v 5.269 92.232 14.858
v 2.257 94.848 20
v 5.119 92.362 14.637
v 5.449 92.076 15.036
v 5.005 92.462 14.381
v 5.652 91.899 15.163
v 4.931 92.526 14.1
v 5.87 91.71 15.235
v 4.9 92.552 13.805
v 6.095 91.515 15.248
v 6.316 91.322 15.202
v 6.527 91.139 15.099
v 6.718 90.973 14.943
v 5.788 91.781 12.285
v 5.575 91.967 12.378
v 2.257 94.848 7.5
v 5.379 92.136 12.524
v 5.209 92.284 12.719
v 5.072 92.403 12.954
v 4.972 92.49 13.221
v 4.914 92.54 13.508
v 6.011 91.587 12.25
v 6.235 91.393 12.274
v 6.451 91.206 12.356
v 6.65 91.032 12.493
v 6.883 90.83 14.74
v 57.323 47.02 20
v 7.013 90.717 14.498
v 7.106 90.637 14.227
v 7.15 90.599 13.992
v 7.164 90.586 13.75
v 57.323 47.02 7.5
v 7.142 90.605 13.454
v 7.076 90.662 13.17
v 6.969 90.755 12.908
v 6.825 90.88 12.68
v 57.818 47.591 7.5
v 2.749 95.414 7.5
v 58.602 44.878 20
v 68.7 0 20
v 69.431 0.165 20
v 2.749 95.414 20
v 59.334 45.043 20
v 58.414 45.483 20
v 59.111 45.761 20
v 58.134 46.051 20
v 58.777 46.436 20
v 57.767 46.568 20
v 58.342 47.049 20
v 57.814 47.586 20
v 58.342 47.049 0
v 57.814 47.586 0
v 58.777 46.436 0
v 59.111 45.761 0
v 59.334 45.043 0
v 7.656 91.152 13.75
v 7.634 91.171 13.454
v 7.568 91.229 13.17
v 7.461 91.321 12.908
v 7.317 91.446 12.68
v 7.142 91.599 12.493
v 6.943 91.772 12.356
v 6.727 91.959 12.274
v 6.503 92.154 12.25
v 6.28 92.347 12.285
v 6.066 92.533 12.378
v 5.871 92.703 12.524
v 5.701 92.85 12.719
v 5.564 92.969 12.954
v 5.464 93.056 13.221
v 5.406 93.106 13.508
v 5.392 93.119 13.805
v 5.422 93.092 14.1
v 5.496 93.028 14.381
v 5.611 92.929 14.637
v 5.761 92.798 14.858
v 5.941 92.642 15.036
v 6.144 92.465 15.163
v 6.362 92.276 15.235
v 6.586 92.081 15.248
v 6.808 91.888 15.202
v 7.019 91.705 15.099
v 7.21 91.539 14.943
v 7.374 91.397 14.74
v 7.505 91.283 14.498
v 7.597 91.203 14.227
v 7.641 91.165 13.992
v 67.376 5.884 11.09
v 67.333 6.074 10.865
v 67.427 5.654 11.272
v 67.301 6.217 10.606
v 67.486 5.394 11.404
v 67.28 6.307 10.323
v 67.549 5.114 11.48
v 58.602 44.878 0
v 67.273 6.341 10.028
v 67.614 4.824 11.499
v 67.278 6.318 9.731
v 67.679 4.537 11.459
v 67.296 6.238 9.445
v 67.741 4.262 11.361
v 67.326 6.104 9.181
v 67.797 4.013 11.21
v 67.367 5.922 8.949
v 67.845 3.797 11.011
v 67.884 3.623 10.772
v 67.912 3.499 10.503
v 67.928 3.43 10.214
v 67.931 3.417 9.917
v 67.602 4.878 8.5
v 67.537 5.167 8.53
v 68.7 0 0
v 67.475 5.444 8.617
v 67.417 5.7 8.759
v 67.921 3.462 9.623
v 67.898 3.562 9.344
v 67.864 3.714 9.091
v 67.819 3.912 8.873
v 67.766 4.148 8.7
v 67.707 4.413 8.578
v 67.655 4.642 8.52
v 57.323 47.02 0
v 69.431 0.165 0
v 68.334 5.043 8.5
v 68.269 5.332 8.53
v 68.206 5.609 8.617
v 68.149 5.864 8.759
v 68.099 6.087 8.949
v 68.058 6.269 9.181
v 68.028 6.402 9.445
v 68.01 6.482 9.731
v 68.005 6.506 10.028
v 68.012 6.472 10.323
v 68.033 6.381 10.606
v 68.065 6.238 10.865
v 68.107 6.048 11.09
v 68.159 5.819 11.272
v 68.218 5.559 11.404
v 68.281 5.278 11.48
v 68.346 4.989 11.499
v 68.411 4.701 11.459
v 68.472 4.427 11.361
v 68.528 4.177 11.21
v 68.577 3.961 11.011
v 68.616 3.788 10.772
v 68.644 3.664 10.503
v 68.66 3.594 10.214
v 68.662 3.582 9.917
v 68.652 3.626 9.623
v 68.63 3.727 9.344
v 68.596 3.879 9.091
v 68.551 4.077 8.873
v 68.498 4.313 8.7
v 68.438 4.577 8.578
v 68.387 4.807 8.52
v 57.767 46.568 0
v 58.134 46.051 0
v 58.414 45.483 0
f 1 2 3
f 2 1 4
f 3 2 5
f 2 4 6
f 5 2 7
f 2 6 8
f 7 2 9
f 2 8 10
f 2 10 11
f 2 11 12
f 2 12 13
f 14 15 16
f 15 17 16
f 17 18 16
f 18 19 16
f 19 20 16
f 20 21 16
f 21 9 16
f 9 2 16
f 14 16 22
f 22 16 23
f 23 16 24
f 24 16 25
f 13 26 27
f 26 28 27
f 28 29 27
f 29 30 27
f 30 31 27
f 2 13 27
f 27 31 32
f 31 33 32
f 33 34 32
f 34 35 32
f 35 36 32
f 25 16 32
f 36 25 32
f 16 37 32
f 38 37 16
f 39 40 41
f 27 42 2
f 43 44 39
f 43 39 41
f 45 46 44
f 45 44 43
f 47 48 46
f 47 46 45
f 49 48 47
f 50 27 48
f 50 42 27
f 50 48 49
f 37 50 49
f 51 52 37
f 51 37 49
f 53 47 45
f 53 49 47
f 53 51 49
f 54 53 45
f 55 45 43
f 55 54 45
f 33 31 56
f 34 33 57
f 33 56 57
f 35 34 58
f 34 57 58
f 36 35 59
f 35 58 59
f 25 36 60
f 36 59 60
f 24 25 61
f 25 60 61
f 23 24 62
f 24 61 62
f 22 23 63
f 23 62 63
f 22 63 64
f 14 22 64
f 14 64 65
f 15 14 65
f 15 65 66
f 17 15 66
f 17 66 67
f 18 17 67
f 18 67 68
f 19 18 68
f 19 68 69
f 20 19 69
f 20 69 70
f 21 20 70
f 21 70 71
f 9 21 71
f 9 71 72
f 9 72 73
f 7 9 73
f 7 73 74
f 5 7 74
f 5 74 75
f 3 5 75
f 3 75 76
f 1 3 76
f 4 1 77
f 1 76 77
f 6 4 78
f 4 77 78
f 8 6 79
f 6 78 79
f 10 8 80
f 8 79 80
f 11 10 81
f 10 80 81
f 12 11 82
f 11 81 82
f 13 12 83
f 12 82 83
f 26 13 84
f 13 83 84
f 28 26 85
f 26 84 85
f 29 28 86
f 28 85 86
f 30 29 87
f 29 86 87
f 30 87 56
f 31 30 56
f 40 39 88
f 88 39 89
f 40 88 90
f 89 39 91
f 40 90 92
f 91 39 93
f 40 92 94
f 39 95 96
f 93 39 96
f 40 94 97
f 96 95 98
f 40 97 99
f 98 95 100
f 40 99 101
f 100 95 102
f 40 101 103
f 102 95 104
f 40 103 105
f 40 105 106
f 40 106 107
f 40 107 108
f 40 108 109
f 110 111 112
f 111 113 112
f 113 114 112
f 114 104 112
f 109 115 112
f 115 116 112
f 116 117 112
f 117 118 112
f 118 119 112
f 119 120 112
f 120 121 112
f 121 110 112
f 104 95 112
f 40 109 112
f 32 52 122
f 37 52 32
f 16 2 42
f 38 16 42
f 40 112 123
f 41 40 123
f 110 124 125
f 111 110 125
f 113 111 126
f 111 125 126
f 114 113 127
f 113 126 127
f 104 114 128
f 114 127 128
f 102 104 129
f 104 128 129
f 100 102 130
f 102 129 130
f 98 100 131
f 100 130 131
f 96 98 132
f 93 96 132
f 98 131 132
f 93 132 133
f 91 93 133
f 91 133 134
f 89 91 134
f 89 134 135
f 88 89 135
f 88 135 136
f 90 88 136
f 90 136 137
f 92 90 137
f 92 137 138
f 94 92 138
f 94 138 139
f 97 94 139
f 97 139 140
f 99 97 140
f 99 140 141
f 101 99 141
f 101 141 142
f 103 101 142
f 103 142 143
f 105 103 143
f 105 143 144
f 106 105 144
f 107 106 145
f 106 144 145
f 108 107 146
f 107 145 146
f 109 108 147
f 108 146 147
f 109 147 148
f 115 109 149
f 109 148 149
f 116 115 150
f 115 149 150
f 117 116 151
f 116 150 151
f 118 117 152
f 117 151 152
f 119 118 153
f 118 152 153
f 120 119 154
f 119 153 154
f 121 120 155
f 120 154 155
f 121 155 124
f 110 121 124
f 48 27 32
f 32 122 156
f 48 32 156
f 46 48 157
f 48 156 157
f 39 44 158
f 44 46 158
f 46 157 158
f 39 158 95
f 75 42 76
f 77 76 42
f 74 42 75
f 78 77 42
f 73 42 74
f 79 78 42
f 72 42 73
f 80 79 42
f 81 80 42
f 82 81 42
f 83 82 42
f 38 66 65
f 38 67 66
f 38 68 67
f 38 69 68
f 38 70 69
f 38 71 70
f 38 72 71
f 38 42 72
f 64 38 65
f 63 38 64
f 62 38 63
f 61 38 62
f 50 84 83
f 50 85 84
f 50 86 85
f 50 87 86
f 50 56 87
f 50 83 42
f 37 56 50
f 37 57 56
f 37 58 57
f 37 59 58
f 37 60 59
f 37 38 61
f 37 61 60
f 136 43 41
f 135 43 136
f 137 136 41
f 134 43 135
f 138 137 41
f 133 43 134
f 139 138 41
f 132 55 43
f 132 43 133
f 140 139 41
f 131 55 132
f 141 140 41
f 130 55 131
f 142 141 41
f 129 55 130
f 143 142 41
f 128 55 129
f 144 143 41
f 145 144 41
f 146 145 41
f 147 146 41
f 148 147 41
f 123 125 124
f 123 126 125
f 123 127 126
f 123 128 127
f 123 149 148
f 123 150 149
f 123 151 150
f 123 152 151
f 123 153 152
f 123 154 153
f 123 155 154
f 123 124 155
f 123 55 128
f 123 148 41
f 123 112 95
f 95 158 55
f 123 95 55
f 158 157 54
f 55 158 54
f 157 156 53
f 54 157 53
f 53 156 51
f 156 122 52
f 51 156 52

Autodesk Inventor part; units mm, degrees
ref_plane "YZ Plane" through (0, 0, 0) normal (1, 0, 0) x (0, 1, 0)
ref_plane "XZ Plane" through (0, 0, 0) normal (0, 1, 0) x (-1, 0, 0)
ref_plane "XY Plane" through (0, 0, 0) normal (0, 0, 1) x (1, 0, 0)
sketch "スケッチ1" plane through (0, 0, 0) normal (0, 0, 1) x (1, 0, 0)
  circle A0 centre (54.6996, 44) radius 4
  line L0 (62.6996, 0) -> (65.6996, 0)
  circle A1 centre (-0.366, 91.8281) radius 4
  circle A2 centre (-0.366, 91.8281) radius 4
  circle A3 centre (54.6996, 44) radius 4
  line L1 (58.602, 44.878) -> (68.6996, 0)
  line L2 (2.257, 94.8481) -> (57.3226, 47.0199)
  line L3 (2.7488, 95.4143) -> (57.8144, 47.5861)
  line L4 (59.3337, 45.0427) -> (69.4313, 0.1646)
  circle A4 centre (54.6996, 44) radius 4.75
  line L5 (2.257, 94.8481) -> (2.7488, 95.4143)
  line L6 (68.6996, 0) -> (69.4313, 0.1646)
  point P0 (0, 0)
  dimension "d0" = 0.75
  dimension "d1" = 0.75
  dimension "d2" = 0.75
extrude "押し出し1" add sketch "スケッチ1" along normal blind 20 contours A0 L2 A4 L1 | A4 L4 L6 L1 | L2 L5 L3 A4 picked at (56.3248, 48.0683)
sketch "スケッチ2" plane through (2.7488, 95.4143, 20) normal (0.6557, 0.755, 0) x (0.755, -0.6557, 0)
  line L0 (72.9366, 20) -> (0, 20) projected
  line L1 (0, 20) -> (0, 0) projected
  line L2 (72.9366, 0) -> (0, 0) projected
  line L3 (72.9366, 20) -> (72.9366, 0) projected
  line L4 (5, 0) -> (5, 20)
  circle A0 centre (5, 6.25) radius 1.5
  line L5 (72.9366, 12.5) -> (0, 12.5)
  point P0 (60.4926, 20)
  dimension "d5" = 5
  dimension "d6" = 3
  dimension "d7" = 6.25
  dimension "d15" = 7.5
sketch "スケッチ3" plane through (59.3337, 45.0427, 20) normal (0.9756, 0.2195, 0) x (0, 0, -1)
  line L0 (20, -46) -> (20, 0) projected
  line L1 (20, 0) -> (0, 0) projected
  line L2 (0, -46) -> (0, 0) projected
  line L3 (20, -46) -> (0, -46) projected
  line L4 (0, -41) -> (20, -41)
  circle A0 centre (10, -41) radius 1.5
  point P0 (20, -30.9196)
  dimension "d8" = 5
  dimension "d9" = 3
  dimension "d10" = 10
extrude "押し出し2" cut sketch "スケッチ2" against normal blind 10 contours L3 L5 L4 L0 | L4 L5 L1 L0 | A0 L4 | L4 A0
extrude "押し出し3" cut sketch "スケッチ3" against normal blind 10 contours A0 L4 | L4 A0
properties part number "アームガードfull" material "ポリプロピレン"
